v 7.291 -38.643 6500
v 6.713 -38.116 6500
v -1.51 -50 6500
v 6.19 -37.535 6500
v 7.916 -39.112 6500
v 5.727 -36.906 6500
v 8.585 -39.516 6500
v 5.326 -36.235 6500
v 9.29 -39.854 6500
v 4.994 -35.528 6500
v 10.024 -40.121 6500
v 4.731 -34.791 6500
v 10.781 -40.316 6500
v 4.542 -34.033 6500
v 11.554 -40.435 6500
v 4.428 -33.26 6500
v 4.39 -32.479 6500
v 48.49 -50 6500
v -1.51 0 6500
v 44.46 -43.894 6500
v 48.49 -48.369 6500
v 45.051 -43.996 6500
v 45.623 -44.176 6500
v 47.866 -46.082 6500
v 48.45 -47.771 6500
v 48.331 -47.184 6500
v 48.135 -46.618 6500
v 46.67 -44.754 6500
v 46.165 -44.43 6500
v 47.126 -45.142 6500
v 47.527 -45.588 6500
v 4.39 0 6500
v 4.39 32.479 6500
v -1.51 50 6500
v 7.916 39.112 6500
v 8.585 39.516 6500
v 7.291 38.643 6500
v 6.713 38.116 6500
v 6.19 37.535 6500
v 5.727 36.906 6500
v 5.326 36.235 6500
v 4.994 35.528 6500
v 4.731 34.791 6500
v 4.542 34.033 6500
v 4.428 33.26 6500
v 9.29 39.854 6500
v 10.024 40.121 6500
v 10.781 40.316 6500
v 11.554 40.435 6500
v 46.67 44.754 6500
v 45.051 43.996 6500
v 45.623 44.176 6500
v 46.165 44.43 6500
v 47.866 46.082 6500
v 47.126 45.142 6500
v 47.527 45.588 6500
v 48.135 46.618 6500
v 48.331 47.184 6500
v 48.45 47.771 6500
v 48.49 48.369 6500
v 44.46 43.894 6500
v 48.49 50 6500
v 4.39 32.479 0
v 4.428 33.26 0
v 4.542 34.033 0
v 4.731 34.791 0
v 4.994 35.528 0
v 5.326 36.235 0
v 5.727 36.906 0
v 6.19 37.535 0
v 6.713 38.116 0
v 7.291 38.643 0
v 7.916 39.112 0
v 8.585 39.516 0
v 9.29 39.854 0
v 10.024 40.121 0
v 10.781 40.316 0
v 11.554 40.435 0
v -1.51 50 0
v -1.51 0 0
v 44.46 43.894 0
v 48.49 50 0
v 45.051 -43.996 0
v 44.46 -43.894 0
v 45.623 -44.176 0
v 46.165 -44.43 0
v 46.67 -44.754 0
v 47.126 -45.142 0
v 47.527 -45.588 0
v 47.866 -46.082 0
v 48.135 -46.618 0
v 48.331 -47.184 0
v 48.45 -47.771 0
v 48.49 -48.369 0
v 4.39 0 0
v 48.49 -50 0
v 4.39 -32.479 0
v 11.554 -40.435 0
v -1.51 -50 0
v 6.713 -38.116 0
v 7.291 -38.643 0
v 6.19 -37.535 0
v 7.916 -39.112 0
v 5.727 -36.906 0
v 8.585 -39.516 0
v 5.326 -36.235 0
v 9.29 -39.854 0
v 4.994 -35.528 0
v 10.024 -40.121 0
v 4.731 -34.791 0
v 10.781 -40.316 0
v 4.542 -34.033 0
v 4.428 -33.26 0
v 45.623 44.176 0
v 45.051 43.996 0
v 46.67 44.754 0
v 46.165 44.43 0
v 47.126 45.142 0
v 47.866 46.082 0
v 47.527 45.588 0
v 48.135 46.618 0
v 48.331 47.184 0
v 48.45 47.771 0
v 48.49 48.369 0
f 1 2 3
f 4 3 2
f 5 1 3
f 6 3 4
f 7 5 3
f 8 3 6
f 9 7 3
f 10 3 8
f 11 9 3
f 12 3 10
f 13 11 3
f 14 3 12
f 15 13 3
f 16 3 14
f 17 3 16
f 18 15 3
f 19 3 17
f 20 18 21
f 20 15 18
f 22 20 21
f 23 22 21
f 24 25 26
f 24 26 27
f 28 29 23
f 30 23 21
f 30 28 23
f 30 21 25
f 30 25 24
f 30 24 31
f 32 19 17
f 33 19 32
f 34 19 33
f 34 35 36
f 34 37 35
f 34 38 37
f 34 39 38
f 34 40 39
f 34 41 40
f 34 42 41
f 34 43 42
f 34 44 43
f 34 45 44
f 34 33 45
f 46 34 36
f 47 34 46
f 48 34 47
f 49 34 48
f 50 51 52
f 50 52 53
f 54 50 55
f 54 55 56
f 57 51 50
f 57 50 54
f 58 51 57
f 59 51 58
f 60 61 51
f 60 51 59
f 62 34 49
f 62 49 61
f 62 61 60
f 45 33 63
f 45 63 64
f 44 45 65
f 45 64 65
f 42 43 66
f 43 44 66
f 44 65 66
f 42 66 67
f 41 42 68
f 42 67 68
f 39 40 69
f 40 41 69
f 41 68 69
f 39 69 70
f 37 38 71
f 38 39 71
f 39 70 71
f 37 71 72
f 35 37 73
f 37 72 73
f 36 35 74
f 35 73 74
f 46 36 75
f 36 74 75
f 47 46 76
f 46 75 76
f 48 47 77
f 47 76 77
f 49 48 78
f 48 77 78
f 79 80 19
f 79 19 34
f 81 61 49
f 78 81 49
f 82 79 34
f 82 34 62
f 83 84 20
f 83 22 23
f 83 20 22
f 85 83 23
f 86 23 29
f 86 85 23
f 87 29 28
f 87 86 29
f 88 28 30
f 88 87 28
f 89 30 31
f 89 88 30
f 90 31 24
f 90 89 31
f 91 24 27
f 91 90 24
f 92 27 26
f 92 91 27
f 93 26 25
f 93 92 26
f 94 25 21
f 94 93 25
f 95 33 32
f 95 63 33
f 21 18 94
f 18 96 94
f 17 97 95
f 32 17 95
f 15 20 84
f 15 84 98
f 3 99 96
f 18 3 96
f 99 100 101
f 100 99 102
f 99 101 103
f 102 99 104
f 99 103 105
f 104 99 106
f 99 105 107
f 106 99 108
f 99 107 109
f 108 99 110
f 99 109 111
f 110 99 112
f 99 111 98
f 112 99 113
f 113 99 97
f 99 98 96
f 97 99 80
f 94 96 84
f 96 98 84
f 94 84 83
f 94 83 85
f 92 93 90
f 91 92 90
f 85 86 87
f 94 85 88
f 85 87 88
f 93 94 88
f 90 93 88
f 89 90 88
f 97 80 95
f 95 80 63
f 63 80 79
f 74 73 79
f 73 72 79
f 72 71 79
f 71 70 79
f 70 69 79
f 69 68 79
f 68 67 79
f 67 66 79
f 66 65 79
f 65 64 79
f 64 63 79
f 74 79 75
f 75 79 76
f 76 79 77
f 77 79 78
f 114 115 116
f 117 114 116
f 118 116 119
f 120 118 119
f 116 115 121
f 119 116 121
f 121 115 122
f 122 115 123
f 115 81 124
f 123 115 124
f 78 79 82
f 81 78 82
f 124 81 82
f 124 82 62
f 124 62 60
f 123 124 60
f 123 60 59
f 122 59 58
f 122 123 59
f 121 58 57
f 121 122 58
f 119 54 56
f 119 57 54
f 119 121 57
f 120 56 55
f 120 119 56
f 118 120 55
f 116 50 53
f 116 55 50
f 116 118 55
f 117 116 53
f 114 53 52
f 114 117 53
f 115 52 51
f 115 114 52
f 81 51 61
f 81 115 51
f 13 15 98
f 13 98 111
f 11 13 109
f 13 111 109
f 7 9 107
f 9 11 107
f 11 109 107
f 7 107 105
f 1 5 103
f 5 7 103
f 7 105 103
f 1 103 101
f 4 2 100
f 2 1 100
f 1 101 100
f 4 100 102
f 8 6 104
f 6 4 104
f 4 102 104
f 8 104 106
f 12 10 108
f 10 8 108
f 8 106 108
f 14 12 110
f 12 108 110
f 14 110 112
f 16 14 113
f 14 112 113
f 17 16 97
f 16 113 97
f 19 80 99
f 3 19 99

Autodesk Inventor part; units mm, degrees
ref_plane "YZ Plane" through (0, 0, 0) normal (1, 0, 0) x (0, 1, 0)
ref_plane "Start Plane" through (0, 0, 0) normal (0, 0, 1) x (1, 0, 0)
ref_plane "End Plane" through (0, 0, 6500) normal (0, 0, 1) x (1, 0, 0)
sketch "Sketch" plane through (0, 0, 0) normal (0, 0, 1) x (1, 0, 0)
  line L0 (-1.51, 0) -> (-1.51, 50)
  line L1 (-1.51, 50) -> (48.49, 50)
  line L2 (48.49, 50) -> (48.49, 48.3694)
  line L3 (44.4604, 43.894) -> (11.5538, 40.4354)
  line L4 (4.39, 32.4792) -> (4.39, 0)
  line L5 (4.39, 0) -> (-1.51, 0) construction
  line L6 (26.44, 50) -> (26.44, 42) construction
  line L7 (48.49, 44.3175) -> (48.49, 42) construction
  line L8 (48.49, 42) -> (26.44, 42) construction
  line L9 (0, 15) -> (0, -27) construction
  line L10 (-5.539, 0) -> (16.0067, 0) construction
  line L11 (-1.51, 0) -> (-1.51, -50)
  line L12 (-1.51, -50) -> (48.49, -50)
  line L13 (48.49, -50) -> (48.49, -48.3694)
  line L14 (44.4604, -43.894) -> (11.5538, -40.4354)
  line L15 (4.39, -32.4792) -> (4.39, 0)
  arc A0 (11.5538, 40.4354) -> (4.39, 32.4792) centre (12.39, 32.4792) ccw
  arc A1 (4.39, -32.4792) -> (11.5538, -40.4354) centre (12.39, -32.4792) ccw
  arc A2 (44.4604, 43.894) -> (48.49, 48.3694) centre (43.99, 48.3694) ccw
  arc A3 (48.49, -48.3694) -> (44.4604, -43.894) centre (43.99, -48.3694) ccw
  line L16 (0, 70) -> (0, -70) construction
  line L17 (-16.5166, 0) -> (60.3266, 0) construction
  point P0 (4.39, 39.6825)
  point P1 (48.49, -44.3175)
  point P2 (4.39, -39.6825)
  point P3 (26.44, -50)
  point P4 (26.44, -42)
  dimension "d0" = 5.9
  dimension "d1" = 50
  dimension "d2" = 50
  dimension "d3" = 8
  dimension "d4" = 22.05
  dimension "d5" = 2.3175
  dimension "d23" = 8
  dimension "d24" = 4.5
  dimension "d25" = 1.51
extrude "Body" add sketch "Sketch" along normal up to surface (6500 mm away) from surface at 0
sketch "Sketch3" plane through (0, 0, 0) normal (0, 0, 1) x (1, 0, 0)
  line L0 (0, 0) -> (10, 0)
ref_plane "Work Plane3" through (0, 0, 0) normal (0, -1, 0) x (1, 0, 0)
sketch "Sketch4" plane through (0, 0, 0) normal (0, -1, 0) x (1, 0, 0)
  line L0 (-2, 0) -> (12, 0) projected
  line L1 (-2, 6500) -> (12, 6500) projected
  dimension "d29" = 6500
equation "\"d0\" = G_T"
equation "\"d1\" = 0.5 * G_H"
equation "\"d2\" = G_W"
equation "\"d3\" = G_T1"
equation "\"d4\" = G_C"
equation "\"d23\" = G_IR"
equation "\"d24\" = G_ER"
equation "\"d25\" = ex"
equation "\"d6\" = G_L"
equation "\"G_W\" = 50"
equation "\"G_H\" = 100"
equation "\"G_T\" = 5.9"
equation "\"G_T1\" = 8"
equation "\"G_NG\" = 0.105104"
equation "\"G_ER\" = 4.5"
equation "\"G_IR\" = 8"
equation "\"G_C\" = 22.05"
equation "\"G_L\" = d29"
equation "\"ex\" = 1.51"
equation "\"G_OFFSET_START\" = 0"
equation "\"G_OFFSET_END\" = 0"
properties part number "ISO 657/11 - CH 100 x 10 - 6500" material "Steel, Mild"
